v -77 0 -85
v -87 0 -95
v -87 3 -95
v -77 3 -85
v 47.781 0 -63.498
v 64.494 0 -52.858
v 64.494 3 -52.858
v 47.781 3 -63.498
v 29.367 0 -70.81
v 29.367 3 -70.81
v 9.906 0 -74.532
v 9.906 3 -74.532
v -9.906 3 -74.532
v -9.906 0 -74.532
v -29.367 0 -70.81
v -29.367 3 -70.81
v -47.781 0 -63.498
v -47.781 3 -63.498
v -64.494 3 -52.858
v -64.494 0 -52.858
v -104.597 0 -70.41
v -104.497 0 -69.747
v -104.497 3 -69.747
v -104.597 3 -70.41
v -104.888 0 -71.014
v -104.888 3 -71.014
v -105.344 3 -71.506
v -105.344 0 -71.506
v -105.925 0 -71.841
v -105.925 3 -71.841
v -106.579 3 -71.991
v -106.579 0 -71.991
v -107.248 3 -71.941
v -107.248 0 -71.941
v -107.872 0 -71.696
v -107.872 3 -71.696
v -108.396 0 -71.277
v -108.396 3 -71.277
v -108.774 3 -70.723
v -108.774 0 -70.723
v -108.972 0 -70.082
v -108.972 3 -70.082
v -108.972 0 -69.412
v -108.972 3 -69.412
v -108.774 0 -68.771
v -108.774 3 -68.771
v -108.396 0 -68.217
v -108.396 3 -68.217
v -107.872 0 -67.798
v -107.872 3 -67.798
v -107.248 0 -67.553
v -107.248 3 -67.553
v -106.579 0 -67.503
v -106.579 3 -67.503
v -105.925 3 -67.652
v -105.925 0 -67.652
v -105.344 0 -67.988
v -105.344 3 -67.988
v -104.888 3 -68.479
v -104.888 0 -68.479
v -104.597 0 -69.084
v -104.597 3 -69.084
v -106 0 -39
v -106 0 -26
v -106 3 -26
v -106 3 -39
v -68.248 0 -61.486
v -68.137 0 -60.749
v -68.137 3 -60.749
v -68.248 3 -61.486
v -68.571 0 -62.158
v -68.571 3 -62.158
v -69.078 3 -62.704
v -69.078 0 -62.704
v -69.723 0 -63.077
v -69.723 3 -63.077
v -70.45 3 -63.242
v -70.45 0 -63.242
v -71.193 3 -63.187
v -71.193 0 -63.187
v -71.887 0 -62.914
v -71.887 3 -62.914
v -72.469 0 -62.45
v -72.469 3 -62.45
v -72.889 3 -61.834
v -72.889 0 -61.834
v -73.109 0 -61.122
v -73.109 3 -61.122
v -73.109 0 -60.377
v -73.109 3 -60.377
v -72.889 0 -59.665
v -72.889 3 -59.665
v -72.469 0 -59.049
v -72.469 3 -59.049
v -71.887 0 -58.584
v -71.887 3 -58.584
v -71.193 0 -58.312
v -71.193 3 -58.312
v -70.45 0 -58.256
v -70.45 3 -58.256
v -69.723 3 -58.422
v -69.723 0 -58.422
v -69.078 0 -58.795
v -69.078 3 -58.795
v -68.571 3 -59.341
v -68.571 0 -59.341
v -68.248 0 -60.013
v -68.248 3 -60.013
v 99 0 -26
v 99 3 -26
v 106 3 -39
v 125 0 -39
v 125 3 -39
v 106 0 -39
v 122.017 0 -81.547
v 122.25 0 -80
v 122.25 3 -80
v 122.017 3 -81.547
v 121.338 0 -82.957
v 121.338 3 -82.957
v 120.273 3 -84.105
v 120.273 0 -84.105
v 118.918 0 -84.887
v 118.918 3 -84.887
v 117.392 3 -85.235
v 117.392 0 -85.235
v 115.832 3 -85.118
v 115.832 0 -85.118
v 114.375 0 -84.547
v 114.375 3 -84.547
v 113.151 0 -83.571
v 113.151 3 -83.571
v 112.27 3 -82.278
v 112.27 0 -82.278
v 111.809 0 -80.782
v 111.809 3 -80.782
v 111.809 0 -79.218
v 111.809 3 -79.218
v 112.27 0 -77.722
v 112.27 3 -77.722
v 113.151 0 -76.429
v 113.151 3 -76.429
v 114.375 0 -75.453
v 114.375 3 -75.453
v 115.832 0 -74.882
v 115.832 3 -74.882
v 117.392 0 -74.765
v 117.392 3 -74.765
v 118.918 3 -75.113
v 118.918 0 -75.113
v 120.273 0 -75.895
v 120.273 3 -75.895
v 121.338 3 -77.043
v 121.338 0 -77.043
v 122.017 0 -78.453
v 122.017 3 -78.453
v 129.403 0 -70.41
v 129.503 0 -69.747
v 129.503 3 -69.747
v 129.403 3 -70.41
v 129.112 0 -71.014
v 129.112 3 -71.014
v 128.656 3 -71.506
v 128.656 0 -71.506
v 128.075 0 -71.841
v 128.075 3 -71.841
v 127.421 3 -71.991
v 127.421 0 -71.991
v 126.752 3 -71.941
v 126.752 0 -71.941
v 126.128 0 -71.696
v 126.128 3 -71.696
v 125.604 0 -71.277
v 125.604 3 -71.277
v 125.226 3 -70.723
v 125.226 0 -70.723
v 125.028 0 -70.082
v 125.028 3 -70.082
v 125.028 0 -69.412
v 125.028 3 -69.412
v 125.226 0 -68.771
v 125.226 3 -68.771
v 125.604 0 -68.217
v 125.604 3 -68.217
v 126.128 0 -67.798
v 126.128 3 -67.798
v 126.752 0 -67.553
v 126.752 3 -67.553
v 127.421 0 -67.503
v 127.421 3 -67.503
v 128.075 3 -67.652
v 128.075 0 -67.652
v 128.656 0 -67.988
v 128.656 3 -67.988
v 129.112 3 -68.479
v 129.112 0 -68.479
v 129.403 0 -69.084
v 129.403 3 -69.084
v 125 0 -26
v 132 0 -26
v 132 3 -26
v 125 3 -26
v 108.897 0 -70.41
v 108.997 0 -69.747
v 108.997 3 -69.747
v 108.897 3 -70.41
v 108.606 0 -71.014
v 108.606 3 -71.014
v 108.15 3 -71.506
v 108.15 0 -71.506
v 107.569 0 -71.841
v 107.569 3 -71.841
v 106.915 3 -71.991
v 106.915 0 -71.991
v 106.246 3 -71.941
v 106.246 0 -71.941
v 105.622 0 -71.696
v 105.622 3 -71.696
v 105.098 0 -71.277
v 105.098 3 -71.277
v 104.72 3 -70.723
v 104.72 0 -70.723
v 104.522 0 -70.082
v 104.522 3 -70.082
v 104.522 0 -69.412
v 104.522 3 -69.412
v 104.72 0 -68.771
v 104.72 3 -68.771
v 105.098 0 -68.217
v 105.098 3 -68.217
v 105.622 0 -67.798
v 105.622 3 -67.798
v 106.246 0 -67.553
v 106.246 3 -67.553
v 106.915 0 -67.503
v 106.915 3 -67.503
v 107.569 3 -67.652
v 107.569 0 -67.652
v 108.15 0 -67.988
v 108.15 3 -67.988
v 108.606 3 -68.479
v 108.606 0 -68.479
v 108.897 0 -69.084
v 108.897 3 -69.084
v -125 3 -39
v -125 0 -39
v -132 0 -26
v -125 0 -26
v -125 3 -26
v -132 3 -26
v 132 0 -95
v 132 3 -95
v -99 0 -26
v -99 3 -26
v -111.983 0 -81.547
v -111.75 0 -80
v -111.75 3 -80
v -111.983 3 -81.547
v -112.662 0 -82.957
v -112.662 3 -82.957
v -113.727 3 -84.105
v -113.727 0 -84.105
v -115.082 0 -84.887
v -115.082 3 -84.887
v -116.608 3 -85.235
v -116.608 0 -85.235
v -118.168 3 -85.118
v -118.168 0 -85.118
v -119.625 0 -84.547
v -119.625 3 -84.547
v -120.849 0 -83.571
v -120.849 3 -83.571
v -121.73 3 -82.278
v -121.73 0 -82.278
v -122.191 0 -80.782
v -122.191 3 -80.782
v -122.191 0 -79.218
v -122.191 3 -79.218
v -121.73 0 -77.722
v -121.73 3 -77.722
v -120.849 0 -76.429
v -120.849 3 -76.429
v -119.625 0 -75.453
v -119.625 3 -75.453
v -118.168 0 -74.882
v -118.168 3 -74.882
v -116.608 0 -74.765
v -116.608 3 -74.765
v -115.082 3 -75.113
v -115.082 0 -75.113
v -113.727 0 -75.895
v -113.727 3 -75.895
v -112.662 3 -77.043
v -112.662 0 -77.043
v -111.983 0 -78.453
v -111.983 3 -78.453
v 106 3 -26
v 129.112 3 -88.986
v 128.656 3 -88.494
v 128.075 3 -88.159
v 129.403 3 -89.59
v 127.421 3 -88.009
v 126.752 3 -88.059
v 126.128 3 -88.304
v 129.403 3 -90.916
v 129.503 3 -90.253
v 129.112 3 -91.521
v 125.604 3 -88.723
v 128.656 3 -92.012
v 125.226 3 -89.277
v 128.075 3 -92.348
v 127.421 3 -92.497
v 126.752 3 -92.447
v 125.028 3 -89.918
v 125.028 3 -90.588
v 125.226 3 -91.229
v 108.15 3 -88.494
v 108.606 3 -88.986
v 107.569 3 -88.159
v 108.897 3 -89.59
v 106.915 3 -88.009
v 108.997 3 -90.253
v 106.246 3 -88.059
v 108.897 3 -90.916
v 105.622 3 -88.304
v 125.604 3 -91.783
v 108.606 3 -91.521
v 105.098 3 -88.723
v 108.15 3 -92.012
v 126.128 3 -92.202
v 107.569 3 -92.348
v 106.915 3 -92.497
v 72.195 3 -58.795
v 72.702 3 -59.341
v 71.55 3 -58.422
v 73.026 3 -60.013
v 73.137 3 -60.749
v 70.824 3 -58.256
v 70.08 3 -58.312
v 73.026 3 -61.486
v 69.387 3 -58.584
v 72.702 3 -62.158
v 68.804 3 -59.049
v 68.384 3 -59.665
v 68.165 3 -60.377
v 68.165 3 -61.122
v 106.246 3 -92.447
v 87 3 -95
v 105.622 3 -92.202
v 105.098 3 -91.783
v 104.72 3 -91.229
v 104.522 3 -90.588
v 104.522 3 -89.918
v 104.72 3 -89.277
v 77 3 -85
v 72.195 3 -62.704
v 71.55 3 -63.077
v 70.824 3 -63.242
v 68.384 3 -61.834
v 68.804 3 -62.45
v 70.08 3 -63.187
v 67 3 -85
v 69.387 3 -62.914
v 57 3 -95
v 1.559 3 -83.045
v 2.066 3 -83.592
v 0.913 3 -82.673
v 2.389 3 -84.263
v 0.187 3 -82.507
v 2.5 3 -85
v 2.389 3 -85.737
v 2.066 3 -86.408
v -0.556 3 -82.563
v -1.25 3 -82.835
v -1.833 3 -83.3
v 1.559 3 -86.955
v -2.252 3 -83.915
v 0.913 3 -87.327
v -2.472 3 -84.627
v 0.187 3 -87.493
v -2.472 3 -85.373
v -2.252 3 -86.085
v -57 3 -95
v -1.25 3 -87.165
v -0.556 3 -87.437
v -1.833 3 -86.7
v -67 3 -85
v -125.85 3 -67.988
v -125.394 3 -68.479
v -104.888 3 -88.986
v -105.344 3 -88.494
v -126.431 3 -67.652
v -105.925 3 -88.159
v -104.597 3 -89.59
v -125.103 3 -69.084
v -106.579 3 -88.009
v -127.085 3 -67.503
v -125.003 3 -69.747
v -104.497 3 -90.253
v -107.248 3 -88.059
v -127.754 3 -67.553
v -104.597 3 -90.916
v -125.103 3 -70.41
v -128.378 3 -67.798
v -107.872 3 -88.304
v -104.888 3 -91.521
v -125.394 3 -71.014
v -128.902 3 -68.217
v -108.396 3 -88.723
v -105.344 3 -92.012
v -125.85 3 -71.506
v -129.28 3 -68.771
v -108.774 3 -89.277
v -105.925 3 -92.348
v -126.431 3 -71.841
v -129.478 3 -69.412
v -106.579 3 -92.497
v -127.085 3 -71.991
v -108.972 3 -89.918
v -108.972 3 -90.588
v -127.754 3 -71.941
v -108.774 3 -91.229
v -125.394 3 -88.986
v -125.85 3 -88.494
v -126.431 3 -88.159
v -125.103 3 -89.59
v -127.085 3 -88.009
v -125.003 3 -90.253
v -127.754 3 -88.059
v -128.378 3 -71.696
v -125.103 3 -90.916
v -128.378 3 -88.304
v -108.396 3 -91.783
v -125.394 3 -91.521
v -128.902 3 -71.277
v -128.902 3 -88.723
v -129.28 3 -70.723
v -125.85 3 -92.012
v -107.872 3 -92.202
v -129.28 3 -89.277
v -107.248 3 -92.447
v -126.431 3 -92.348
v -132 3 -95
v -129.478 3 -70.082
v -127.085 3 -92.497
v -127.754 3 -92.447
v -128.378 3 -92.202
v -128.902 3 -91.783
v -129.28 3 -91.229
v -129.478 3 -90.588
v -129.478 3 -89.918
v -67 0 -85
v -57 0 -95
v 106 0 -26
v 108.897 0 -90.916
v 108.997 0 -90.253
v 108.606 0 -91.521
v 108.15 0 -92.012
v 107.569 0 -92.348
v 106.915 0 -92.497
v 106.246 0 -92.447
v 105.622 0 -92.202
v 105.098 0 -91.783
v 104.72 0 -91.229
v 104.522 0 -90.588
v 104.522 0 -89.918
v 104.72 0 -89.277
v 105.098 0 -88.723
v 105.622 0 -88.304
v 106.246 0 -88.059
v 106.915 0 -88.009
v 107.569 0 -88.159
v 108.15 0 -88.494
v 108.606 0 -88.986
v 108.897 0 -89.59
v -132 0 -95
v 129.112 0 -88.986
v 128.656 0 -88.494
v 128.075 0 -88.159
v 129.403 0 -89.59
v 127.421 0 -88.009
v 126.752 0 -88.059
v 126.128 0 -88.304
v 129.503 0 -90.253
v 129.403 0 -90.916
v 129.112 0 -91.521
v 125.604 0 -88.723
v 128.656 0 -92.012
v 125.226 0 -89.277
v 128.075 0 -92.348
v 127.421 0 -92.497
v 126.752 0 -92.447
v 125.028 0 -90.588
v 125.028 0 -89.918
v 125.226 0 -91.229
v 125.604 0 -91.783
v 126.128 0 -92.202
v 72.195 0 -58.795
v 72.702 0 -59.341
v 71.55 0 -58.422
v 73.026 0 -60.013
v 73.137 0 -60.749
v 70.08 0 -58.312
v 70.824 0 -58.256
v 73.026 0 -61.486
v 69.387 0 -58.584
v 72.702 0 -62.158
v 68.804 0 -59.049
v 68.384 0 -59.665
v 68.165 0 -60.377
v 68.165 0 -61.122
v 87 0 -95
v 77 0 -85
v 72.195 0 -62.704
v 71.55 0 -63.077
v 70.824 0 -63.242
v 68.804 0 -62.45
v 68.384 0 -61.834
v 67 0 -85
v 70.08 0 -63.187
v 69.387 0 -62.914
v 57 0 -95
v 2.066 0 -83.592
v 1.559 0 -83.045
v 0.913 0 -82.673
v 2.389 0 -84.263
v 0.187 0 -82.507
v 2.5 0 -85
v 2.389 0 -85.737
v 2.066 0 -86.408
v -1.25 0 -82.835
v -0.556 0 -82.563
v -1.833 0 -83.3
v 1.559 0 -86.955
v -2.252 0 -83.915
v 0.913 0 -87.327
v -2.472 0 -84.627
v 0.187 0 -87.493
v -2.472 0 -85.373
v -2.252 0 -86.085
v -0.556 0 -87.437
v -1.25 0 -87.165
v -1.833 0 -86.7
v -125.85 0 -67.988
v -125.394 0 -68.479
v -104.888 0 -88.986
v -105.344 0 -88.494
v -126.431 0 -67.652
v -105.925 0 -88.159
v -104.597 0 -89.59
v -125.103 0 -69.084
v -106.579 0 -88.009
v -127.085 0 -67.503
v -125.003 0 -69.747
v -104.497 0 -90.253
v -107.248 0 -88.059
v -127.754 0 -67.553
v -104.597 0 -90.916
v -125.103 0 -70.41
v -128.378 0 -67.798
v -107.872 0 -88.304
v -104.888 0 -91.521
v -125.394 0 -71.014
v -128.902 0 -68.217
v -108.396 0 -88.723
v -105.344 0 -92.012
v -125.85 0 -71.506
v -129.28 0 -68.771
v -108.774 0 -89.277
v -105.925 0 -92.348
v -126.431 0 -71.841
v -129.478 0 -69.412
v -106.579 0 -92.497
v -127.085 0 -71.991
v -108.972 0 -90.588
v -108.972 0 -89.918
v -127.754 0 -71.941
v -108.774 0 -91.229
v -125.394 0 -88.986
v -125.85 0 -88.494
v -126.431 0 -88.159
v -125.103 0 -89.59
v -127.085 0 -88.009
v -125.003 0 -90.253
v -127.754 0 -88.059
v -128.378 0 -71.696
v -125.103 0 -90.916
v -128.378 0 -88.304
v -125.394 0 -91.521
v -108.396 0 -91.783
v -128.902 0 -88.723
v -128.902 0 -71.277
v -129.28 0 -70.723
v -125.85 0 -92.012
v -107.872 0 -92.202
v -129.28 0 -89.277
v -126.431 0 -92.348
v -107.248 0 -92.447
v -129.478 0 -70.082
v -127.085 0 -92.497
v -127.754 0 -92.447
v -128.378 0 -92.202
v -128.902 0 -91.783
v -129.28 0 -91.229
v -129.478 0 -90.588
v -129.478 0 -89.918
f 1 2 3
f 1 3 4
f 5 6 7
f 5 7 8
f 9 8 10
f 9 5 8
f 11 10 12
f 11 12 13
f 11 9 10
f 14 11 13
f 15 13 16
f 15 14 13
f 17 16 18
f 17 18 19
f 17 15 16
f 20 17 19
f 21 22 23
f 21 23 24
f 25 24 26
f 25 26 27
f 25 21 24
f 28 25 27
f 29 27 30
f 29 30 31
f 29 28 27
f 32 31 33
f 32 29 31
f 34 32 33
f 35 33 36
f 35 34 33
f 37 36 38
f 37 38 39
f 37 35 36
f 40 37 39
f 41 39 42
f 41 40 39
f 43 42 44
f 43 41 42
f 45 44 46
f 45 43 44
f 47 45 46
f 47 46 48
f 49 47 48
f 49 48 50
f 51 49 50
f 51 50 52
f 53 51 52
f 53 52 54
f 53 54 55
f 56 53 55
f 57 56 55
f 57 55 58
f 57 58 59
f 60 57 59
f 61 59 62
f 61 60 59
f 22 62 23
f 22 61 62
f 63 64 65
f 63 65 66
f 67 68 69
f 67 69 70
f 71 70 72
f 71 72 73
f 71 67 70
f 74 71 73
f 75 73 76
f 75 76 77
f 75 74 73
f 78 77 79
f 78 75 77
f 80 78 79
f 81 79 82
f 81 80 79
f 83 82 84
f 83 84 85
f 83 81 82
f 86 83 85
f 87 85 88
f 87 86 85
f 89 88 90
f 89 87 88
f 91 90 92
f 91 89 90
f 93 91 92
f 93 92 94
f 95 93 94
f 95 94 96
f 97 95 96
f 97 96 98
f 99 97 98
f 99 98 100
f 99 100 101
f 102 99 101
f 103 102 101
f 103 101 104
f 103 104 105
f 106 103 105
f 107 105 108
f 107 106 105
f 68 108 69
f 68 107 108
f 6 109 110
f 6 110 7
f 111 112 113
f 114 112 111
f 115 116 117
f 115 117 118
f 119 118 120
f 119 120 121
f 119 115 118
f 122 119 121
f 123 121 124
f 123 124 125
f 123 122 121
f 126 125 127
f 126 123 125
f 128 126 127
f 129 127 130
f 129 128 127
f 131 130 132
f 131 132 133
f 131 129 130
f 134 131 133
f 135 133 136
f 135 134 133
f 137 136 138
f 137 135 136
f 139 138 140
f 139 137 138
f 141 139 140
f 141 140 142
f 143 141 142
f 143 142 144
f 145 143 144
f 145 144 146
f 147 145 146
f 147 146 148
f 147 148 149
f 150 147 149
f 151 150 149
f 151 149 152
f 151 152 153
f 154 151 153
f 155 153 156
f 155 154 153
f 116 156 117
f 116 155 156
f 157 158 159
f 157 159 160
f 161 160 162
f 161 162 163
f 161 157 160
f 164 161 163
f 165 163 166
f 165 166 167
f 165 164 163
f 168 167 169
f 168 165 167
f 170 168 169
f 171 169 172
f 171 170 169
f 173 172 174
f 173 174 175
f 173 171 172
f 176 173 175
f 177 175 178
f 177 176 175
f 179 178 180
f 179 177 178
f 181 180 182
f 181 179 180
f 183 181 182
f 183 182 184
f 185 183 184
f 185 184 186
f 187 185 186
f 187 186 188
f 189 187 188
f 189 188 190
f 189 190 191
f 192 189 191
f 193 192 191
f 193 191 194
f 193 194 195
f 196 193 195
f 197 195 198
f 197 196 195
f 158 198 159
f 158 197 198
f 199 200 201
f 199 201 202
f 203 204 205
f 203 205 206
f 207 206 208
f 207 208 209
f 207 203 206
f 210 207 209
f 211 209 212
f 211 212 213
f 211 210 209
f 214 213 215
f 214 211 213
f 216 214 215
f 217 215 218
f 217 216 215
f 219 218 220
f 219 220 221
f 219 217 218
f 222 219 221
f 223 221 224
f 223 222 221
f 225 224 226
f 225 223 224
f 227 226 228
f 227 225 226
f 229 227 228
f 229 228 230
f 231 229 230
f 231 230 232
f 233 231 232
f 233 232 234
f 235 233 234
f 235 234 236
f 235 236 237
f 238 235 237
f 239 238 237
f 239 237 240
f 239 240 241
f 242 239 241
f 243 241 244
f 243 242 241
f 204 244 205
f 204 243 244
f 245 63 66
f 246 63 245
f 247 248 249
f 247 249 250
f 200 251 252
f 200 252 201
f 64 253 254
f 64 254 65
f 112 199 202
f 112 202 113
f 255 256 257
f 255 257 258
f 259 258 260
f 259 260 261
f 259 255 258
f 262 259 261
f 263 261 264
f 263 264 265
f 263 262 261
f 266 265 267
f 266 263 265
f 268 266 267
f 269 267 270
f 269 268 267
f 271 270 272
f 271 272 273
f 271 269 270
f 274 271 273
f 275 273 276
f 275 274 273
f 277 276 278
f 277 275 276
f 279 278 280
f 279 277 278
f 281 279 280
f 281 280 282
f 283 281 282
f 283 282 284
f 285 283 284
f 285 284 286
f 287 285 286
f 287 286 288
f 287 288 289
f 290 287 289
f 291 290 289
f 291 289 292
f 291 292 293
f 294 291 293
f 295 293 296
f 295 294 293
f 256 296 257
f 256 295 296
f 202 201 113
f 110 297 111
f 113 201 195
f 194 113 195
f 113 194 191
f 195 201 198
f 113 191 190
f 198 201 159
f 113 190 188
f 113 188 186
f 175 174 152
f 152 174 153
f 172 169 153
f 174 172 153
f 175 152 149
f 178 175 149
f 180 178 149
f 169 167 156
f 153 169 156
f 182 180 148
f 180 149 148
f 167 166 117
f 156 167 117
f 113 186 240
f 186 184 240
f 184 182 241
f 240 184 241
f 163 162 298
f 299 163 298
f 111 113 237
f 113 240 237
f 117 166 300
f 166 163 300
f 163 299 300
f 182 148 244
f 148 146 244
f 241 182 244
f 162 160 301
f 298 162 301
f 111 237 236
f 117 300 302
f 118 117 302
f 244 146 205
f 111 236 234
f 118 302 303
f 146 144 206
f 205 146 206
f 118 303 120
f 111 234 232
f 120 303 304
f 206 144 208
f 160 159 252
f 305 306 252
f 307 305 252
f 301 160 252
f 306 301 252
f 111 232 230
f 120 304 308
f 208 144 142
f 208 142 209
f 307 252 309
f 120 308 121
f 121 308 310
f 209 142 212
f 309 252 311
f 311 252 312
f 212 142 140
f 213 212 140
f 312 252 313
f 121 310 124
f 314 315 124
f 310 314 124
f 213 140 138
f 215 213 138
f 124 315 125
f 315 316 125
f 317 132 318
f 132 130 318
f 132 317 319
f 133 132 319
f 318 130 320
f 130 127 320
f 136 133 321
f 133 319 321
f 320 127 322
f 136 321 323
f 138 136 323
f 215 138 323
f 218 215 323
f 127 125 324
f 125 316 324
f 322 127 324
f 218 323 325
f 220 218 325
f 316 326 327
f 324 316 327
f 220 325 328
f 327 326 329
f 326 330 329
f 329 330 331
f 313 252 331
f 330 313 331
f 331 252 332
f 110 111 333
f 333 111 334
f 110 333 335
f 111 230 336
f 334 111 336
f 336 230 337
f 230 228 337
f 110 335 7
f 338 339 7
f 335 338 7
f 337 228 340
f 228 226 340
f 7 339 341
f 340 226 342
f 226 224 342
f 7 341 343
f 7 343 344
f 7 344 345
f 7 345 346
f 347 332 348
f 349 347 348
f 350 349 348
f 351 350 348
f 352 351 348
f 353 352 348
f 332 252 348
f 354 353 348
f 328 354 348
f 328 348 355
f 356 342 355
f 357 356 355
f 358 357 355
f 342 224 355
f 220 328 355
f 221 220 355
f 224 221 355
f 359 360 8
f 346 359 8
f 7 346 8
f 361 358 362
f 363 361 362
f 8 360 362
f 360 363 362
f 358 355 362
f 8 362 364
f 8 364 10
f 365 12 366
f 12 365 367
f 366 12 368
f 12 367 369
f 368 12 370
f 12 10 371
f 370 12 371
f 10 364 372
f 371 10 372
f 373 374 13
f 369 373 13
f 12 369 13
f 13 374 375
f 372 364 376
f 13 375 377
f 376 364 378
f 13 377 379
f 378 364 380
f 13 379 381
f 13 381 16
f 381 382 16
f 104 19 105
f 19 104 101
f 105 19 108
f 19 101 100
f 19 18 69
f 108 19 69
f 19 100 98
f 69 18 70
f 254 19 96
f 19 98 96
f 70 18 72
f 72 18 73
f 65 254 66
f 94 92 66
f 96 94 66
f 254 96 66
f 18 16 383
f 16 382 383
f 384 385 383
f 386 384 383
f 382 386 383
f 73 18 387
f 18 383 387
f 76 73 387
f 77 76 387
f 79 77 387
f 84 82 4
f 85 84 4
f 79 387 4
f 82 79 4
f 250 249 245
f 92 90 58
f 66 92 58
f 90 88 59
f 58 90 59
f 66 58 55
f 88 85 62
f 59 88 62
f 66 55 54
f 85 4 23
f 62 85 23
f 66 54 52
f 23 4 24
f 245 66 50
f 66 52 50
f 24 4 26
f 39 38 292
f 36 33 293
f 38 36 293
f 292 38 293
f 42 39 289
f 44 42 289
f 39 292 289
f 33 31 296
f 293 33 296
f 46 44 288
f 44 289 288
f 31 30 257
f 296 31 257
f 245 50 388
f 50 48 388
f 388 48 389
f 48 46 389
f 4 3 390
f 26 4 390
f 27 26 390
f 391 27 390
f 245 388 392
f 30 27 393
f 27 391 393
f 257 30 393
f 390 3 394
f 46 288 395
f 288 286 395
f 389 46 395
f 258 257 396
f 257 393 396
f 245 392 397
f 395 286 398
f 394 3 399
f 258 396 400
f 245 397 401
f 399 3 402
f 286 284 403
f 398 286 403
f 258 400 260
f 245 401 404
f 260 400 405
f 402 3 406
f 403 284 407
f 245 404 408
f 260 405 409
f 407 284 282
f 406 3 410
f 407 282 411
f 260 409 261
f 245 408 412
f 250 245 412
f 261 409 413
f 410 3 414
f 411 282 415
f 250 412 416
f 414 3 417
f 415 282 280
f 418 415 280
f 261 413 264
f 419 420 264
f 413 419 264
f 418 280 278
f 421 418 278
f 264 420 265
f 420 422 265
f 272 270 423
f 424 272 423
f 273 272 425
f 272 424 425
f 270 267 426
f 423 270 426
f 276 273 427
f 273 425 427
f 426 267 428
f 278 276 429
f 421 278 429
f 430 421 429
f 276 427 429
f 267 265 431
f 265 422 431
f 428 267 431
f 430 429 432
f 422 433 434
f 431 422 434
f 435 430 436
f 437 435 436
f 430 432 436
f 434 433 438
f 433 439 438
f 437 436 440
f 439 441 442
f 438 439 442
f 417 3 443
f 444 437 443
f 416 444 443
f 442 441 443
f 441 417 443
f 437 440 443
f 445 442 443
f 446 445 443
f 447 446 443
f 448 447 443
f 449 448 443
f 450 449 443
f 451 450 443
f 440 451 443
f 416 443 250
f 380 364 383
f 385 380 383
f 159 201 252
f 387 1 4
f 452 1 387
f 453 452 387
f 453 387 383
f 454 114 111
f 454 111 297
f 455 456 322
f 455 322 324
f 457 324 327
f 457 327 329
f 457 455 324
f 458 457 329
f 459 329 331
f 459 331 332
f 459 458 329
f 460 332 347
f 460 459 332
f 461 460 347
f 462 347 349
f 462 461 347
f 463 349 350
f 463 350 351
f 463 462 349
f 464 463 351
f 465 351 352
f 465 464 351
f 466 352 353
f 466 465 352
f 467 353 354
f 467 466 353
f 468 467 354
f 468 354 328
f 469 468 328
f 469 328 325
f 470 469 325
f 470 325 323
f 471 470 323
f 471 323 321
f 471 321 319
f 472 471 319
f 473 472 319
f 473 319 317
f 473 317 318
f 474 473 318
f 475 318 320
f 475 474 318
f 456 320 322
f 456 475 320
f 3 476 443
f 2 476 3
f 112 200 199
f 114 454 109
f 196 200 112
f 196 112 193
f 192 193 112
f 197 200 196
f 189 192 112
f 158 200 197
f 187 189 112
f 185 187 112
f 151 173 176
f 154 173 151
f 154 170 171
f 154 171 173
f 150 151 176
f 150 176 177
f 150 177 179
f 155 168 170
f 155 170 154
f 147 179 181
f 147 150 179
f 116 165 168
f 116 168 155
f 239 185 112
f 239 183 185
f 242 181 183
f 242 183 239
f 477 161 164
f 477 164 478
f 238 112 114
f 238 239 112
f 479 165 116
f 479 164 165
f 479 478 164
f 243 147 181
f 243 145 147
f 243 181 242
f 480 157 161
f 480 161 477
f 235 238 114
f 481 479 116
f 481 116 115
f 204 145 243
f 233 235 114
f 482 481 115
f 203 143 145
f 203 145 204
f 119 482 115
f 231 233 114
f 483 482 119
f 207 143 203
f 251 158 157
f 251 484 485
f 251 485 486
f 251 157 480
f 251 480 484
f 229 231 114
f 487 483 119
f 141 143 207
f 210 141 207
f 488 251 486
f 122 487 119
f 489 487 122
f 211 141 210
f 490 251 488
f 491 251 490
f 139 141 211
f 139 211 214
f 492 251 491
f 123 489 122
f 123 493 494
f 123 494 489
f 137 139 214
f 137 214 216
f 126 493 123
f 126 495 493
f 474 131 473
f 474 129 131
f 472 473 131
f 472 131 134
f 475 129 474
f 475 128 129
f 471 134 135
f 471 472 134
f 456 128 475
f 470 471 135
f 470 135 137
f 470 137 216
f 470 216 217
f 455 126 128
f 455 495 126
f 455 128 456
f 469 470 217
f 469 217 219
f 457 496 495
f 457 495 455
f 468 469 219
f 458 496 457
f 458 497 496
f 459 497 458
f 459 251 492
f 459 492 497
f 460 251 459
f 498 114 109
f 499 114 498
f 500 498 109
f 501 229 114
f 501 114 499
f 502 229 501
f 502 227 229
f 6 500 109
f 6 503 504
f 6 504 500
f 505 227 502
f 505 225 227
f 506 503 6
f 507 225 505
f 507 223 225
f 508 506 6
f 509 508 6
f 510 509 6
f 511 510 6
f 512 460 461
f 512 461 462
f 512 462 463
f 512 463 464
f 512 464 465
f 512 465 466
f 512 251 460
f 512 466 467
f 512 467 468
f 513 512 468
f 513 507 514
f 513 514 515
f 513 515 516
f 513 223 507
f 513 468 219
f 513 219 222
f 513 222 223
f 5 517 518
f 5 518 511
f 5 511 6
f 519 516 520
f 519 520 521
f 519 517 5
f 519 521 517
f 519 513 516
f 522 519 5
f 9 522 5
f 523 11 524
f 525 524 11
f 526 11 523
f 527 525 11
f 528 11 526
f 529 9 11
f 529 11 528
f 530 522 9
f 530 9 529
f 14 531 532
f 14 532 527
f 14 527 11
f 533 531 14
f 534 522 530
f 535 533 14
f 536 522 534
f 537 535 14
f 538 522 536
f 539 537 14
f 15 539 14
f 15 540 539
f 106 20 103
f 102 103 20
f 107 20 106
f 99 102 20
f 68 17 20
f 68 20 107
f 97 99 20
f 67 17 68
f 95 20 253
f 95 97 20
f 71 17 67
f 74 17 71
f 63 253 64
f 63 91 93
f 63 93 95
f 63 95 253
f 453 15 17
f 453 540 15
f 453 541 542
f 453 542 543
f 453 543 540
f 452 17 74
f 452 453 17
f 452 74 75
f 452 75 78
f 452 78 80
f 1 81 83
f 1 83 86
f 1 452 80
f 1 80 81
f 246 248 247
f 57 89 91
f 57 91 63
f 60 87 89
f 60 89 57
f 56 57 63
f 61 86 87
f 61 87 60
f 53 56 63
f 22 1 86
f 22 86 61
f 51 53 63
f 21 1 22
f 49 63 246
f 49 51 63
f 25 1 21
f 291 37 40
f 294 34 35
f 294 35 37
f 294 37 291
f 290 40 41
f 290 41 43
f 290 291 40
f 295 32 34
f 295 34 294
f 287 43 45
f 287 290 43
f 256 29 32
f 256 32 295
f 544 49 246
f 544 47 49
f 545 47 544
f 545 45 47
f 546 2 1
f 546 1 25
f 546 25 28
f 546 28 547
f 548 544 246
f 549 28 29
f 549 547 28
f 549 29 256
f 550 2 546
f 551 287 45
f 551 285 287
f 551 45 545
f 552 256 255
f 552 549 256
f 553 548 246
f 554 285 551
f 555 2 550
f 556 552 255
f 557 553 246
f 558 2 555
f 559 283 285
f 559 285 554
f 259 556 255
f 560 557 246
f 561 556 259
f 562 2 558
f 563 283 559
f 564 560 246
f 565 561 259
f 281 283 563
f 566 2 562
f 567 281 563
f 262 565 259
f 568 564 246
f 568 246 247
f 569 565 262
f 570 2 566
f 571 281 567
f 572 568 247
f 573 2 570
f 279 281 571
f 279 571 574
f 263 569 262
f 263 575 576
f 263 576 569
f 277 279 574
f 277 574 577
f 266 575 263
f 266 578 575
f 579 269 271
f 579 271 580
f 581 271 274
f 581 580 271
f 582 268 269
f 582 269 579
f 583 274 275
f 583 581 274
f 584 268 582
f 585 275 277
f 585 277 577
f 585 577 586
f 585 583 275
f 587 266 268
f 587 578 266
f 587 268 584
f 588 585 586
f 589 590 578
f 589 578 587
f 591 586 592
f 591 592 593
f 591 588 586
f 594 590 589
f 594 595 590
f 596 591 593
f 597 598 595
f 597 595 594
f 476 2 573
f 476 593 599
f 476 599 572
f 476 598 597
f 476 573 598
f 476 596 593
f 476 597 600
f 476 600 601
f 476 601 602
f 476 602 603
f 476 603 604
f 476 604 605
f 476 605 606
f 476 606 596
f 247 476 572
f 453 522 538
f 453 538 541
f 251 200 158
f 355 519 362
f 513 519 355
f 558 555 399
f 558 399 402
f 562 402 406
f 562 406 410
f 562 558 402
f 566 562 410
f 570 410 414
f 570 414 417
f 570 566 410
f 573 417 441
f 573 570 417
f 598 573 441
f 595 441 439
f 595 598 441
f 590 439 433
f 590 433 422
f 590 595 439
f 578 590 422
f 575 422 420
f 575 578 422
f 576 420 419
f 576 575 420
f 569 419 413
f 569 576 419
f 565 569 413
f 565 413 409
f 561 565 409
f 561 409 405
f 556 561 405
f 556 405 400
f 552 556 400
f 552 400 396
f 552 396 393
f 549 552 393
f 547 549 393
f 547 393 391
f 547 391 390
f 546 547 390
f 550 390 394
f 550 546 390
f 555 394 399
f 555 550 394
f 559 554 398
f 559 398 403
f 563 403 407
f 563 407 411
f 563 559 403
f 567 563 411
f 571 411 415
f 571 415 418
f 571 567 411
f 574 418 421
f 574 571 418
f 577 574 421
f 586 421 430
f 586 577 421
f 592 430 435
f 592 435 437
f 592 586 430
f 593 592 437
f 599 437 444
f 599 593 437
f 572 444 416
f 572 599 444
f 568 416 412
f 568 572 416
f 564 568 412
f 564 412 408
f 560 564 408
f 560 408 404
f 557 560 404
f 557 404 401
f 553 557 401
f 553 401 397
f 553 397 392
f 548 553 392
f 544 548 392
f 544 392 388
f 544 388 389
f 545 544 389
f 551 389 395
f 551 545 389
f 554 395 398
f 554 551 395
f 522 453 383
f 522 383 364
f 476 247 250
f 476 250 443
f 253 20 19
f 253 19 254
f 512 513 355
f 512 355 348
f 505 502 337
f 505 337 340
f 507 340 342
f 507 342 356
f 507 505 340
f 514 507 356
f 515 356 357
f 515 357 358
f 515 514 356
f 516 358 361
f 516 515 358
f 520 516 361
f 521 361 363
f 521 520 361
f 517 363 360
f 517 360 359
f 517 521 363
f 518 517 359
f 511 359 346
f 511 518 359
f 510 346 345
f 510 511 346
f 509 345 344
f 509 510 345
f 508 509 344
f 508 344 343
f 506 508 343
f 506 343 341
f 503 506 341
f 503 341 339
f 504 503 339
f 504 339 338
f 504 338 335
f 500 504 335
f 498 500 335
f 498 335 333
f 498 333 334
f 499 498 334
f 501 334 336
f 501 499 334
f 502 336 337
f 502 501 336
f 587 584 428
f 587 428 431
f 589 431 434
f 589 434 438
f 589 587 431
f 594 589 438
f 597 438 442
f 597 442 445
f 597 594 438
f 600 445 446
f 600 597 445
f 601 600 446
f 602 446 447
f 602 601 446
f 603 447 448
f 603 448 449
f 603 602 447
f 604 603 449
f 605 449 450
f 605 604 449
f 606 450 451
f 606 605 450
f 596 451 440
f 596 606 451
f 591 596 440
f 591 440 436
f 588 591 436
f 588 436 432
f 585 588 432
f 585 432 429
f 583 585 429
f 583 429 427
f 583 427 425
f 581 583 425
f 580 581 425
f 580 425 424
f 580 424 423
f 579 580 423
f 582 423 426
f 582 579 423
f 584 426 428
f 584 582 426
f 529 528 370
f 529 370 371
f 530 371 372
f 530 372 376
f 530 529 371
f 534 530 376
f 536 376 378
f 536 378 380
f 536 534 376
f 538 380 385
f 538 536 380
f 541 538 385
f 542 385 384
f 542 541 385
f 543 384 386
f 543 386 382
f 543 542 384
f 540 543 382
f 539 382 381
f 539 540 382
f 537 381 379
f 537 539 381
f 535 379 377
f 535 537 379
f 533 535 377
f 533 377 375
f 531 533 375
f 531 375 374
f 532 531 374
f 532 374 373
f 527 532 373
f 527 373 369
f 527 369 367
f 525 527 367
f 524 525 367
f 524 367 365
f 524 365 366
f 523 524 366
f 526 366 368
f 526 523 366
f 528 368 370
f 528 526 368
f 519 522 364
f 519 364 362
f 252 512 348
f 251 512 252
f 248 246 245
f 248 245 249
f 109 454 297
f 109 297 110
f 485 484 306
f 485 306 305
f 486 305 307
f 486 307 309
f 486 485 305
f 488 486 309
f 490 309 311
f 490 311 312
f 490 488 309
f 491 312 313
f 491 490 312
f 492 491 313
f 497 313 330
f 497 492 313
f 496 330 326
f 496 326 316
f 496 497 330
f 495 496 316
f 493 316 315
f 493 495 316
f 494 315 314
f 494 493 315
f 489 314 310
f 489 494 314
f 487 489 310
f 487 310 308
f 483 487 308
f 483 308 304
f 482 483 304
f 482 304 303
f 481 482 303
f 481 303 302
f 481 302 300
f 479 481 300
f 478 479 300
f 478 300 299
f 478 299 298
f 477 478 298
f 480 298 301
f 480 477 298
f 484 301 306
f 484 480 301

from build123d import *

# Parameters (mm, degrees)
ESQUISSE1_R      = 5.25
ESQUISSE1_R_2    = 2.25
ESQUISSE1_R_3    = 2.5
EXTRUSION1_DEPTH = 3


with BuildPart() as part:
    # Esquisse1 → Extrusion1 (new body)
    with BuildSketch(Plane(origin=(0, 0, 0), x_dir=(1, 0, 0), z_dir=(0, 1, 0))):
        with BuildLine():
            Line((-64.494367887, 52.858171056), (-99, 26))
            Line((-99, 26), (-106, 26))
            Line((-106, 26), (-106, 39))
            Line((-106, 39), (-125, 39))
            Line((-125, 39), (-125, 26))
            Line((-125, 26), (-132, 26))
            Line((-132, 26), (-132, 95))
            Line((-132, 95), (-87, 95))
            Line((-87, 95), (-77, 85))
            Line((-77, 85), (-67, 85))
            Line((-67, 85), (-57, 95))
            Line((-57, 95), (57, 95))
            Line((57, 95), (67, 85))
            Line((67, 85), (77, 85))
            Line((77, 85), (87, 95))
            Line((87, 95), (132, 95))
            Line((132, 95), (132, 26))
            Line((132, 26), (125, 26))
            Line((125, 26), (125, 39))
            Line((125, 39), (106, 39))
            Line((106, 39), (106, 26))
            Line((106, 26), (99, 26))
            Line((99, 26), (64.494367887, 52.858171056))
            ThreePointArc((64.494367887, 52.858171056), (0, 75), (-64.494367887, 52.858171056))
        make_face()
        with Locations((-117, 80)):
            Circle(ESQUISSE1_R, mode=Mode.SUBTRACT)
        with Locations((117, 80)):
            Circle(ESQUISSE1_R, mode=Mode.SUBTRACT)
        with Locations((-127.253048327, 90.253048327)):
            Circle(ESQUISSE1_R_2, mode=Mode.SUBTRACT)
        with Locations((-106.746951673, 90.253048327)):
            Circle(ESQUISSE1_R_2, mode=Mode.SUBTRACT)
        with Locations((-106.746951673, 69.746951673)):
            Circle(ESQUISSE1_R_2, mode=Mode.SUBTRACT)
        with Locations((-127.253048327, 69.746951673)):
            Circle(ESQUISSE1_R_2, mode=Mode.SUBTRACT)
        with Locations((106.746951673, 69.746951673)):
            Circle(ESQUISSE1_R_2, mode=Mode.SUBTRACT)
        with Locations((127.253048327, 69.746951673)):
            Circle(ESQUISSE1_R_2, mode=Mode.SUBTRACT)
        with Locations((127.253048327, 90.253048327)):
            Circle(ESQUISSE1_R_2, mode=Mode.SUBTRACT)
        with Locations((106.746951673, 90.253048327)):
            Circle(ESQUISSE1_R_2, mode=Mode.SUBTRACT)
        with Locations((-70.636688638, 60.749425443)):
            Circle(ESQUISSE1_R_3, mode=Mode.SUBTRACT)
        with Locations((70.636688638, 60.749425443)):
            Circle(ESQUISSE1_R_3, mode=Mode.SUBTRACT)
        with Locations((0, 85)):
            Circle(ESQUISSE1_R_3, mode=Mode.SUBTRACT)
    extrude(amount=EXTRUSION1_DEPTH)


solid = part.part
